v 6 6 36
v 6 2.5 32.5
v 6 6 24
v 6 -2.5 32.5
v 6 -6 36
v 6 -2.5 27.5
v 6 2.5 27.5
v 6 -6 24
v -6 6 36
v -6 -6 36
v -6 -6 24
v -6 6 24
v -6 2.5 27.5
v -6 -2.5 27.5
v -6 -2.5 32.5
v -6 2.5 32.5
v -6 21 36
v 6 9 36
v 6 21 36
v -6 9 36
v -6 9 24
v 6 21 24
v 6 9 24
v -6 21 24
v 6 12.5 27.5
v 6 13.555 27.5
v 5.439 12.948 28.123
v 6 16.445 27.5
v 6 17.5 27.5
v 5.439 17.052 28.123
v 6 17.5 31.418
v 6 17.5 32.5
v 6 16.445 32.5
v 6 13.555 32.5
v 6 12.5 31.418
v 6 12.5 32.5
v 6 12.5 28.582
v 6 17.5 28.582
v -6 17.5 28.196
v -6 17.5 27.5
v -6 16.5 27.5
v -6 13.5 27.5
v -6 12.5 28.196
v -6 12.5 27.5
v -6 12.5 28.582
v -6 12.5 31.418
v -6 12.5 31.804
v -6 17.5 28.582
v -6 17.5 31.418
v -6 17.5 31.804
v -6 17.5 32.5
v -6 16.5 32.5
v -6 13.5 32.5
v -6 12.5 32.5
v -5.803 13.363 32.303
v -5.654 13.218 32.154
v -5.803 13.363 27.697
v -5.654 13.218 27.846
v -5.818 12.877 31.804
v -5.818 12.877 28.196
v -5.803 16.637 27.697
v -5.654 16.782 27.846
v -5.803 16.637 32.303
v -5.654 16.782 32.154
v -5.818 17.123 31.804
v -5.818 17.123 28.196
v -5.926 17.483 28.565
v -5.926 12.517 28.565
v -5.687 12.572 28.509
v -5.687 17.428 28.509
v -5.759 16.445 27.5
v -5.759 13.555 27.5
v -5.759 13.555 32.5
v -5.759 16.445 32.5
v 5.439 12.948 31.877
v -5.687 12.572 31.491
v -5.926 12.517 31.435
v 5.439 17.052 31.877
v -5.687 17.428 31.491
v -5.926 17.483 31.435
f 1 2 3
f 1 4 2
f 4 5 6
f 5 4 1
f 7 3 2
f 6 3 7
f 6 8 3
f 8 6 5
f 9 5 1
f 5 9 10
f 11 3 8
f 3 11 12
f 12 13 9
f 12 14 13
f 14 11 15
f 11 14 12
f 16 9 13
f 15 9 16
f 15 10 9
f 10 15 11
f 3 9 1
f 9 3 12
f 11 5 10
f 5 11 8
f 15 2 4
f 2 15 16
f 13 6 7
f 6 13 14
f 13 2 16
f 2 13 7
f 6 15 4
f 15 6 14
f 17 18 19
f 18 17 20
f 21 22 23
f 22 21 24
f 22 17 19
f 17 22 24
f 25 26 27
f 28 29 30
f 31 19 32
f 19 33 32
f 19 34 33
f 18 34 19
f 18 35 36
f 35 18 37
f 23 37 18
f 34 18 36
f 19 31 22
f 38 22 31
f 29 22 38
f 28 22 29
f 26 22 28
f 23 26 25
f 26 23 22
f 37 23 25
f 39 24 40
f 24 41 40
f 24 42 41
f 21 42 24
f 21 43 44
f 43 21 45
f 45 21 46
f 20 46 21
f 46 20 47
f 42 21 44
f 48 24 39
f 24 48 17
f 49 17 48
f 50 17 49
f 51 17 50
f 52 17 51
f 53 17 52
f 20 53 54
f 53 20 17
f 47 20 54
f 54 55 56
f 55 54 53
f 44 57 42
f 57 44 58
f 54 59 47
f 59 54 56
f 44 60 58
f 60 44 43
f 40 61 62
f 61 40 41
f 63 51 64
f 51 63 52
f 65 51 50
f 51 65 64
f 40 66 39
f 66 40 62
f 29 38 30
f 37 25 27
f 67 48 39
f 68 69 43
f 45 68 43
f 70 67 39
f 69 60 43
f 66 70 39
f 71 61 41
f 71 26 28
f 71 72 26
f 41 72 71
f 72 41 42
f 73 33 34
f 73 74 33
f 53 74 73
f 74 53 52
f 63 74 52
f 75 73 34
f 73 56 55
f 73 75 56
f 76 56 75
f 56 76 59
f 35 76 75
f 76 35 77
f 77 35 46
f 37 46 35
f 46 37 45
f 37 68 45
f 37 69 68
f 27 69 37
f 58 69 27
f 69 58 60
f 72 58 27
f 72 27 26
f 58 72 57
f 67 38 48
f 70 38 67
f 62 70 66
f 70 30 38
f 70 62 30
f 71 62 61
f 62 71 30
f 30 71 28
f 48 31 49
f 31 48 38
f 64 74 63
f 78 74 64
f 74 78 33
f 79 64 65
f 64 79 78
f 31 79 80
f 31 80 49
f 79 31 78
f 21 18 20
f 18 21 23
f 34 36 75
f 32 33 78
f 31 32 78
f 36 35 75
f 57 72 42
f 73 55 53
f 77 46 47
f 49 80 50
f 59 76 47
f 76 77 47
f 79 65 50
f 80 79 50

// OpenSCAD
/**
 * Library of minkowski-related tricks for OpenSCAD. They are all incredibly
 * slow.
**/

/* Select parts to display */
//render() antiminkowski_example();
//render() translate([0, 0, 15]) chamfer_convex_example();
render() translate([0, 0, 30]) chamfer_concave_example();

/**
 * A minkowski operation convolves two objects' set membership functions. Using
 * Minkowski with a sphere and a part shape gives you the shape of the void you
 * would get if a spherical mill bit followed a path that included every point
 * in the part.
 *
 * The antiminkowski I'm writing is a little different. I want the shape of the
 * material that would be left behind if the mill bit followed every surface on
 * the exterior surface of the part. Essentially, while the original Minkowski
 * expands the part, the antiminkowski will contract it.
 *
 * First child is the "mill bit", and second child is the part.
**/
module antiminkowski(huge=4000000000) {
    // Subtract the expanded mold from the original part
    difference() {
        cube([huge, huge, huge], center=true);
        // Expand the mold form around the part with the "mill bit".
        minkowski() {
            // The "mill bit"
            child(0);
            // Make a mold form around the part. We approximate the complement
            // of a finite part by subtracting the part from a very large box.
            difference() {
                cube([huge, huge, huge], center=true);
                child(1);
            }
        }
    }
}

module antiminkowski_example_part() {
    render() difference() {
        cube([12, 12, 12], center=true);
        cube([12, 5, 5], center=true);
    }
}

module antiminkowski_example() {
    antiminkowski_example_part();
    translate([0, 15, 0]) sphere(r=2);
    translate([0, 15, 0]) antiminkowski() {
        sphere(r=2);
        antiminkowski_example_part();
    }
}

/**
 * Does what you think scale([-1, -1, -1]) ought to do, but without crashing
 * OpenSCAD.
**/
module mirror3() {
    rotate(180, [1, 0, 0]) mirror([1, 0, 0]) child();
}

/**
 * Chamfer outside (convex) corners of a part. First child is shape of chamfer,
 * second child is part. If, for example, you want round chamfers everywhere,
 * use a spherical chamfer shape. If you want round chamfers only on the
 * up-sides of edges and not on bottom edges, you could use a hemisphere shape.
 *
 * Essentially, this will get you the shape of the void created by a mill bit in
 * the chamfer shape milling out as much material as possible while staying
 * entirely within the part volume.
 *
 * If your chamfer shape is larger than some of the details on the part, the
 * details may be obliterated --- if the details are smaller than your mill bit,
 * the mill bit can't get in there to make them.
**/
module chamfer_convex() {
    minkowski() {
        child(0);
        antiminkowski() {
            mirror3() child(0);
            child(1);
        }
    }
}

module chamfer_convex_example() {
    antiminkowski_example_part();
    translate([0, 15, 0]) sphere(r=2);
    translate([0, 15, 0]) chamfer_convex() {
        sphere(r=2);
        antiminkowski_example_part();
    }
}

/**
 * Chamfer inside (concave) corners of a part. First child is shape of chamfer,
 * second child is part. If, for example, you want round chamfers everywhere,
 * use a spherical chamfer shape.
 *
 * Essentially, this will get you the shape of the part left by a mill bit in
 * the chamfer shape milling away as much material as possible while staying
 * entirely outside the part volume.
 *
 * If your chamfer shape is larger than some of the details on the part, the
 * details may be obliterated --- if the details are smaller than your mill bit,
 * the mill bit can't get in there to make them.
**/
module chamfer_concave() {
   antiminkowski() {
       child(0);
       minkowski() {
           mirror3() child(0);
           child(1);
       }
   }
}

module chamfer_concave_example() {
    antiminkowski_example_part();
    //translate([0, 15, 0]) sphere(r=2);
    translate([0, 15, 0]) chamfer_concave() {
        sphere(r=2);
        antiminkowski_example_part();
    }
}
